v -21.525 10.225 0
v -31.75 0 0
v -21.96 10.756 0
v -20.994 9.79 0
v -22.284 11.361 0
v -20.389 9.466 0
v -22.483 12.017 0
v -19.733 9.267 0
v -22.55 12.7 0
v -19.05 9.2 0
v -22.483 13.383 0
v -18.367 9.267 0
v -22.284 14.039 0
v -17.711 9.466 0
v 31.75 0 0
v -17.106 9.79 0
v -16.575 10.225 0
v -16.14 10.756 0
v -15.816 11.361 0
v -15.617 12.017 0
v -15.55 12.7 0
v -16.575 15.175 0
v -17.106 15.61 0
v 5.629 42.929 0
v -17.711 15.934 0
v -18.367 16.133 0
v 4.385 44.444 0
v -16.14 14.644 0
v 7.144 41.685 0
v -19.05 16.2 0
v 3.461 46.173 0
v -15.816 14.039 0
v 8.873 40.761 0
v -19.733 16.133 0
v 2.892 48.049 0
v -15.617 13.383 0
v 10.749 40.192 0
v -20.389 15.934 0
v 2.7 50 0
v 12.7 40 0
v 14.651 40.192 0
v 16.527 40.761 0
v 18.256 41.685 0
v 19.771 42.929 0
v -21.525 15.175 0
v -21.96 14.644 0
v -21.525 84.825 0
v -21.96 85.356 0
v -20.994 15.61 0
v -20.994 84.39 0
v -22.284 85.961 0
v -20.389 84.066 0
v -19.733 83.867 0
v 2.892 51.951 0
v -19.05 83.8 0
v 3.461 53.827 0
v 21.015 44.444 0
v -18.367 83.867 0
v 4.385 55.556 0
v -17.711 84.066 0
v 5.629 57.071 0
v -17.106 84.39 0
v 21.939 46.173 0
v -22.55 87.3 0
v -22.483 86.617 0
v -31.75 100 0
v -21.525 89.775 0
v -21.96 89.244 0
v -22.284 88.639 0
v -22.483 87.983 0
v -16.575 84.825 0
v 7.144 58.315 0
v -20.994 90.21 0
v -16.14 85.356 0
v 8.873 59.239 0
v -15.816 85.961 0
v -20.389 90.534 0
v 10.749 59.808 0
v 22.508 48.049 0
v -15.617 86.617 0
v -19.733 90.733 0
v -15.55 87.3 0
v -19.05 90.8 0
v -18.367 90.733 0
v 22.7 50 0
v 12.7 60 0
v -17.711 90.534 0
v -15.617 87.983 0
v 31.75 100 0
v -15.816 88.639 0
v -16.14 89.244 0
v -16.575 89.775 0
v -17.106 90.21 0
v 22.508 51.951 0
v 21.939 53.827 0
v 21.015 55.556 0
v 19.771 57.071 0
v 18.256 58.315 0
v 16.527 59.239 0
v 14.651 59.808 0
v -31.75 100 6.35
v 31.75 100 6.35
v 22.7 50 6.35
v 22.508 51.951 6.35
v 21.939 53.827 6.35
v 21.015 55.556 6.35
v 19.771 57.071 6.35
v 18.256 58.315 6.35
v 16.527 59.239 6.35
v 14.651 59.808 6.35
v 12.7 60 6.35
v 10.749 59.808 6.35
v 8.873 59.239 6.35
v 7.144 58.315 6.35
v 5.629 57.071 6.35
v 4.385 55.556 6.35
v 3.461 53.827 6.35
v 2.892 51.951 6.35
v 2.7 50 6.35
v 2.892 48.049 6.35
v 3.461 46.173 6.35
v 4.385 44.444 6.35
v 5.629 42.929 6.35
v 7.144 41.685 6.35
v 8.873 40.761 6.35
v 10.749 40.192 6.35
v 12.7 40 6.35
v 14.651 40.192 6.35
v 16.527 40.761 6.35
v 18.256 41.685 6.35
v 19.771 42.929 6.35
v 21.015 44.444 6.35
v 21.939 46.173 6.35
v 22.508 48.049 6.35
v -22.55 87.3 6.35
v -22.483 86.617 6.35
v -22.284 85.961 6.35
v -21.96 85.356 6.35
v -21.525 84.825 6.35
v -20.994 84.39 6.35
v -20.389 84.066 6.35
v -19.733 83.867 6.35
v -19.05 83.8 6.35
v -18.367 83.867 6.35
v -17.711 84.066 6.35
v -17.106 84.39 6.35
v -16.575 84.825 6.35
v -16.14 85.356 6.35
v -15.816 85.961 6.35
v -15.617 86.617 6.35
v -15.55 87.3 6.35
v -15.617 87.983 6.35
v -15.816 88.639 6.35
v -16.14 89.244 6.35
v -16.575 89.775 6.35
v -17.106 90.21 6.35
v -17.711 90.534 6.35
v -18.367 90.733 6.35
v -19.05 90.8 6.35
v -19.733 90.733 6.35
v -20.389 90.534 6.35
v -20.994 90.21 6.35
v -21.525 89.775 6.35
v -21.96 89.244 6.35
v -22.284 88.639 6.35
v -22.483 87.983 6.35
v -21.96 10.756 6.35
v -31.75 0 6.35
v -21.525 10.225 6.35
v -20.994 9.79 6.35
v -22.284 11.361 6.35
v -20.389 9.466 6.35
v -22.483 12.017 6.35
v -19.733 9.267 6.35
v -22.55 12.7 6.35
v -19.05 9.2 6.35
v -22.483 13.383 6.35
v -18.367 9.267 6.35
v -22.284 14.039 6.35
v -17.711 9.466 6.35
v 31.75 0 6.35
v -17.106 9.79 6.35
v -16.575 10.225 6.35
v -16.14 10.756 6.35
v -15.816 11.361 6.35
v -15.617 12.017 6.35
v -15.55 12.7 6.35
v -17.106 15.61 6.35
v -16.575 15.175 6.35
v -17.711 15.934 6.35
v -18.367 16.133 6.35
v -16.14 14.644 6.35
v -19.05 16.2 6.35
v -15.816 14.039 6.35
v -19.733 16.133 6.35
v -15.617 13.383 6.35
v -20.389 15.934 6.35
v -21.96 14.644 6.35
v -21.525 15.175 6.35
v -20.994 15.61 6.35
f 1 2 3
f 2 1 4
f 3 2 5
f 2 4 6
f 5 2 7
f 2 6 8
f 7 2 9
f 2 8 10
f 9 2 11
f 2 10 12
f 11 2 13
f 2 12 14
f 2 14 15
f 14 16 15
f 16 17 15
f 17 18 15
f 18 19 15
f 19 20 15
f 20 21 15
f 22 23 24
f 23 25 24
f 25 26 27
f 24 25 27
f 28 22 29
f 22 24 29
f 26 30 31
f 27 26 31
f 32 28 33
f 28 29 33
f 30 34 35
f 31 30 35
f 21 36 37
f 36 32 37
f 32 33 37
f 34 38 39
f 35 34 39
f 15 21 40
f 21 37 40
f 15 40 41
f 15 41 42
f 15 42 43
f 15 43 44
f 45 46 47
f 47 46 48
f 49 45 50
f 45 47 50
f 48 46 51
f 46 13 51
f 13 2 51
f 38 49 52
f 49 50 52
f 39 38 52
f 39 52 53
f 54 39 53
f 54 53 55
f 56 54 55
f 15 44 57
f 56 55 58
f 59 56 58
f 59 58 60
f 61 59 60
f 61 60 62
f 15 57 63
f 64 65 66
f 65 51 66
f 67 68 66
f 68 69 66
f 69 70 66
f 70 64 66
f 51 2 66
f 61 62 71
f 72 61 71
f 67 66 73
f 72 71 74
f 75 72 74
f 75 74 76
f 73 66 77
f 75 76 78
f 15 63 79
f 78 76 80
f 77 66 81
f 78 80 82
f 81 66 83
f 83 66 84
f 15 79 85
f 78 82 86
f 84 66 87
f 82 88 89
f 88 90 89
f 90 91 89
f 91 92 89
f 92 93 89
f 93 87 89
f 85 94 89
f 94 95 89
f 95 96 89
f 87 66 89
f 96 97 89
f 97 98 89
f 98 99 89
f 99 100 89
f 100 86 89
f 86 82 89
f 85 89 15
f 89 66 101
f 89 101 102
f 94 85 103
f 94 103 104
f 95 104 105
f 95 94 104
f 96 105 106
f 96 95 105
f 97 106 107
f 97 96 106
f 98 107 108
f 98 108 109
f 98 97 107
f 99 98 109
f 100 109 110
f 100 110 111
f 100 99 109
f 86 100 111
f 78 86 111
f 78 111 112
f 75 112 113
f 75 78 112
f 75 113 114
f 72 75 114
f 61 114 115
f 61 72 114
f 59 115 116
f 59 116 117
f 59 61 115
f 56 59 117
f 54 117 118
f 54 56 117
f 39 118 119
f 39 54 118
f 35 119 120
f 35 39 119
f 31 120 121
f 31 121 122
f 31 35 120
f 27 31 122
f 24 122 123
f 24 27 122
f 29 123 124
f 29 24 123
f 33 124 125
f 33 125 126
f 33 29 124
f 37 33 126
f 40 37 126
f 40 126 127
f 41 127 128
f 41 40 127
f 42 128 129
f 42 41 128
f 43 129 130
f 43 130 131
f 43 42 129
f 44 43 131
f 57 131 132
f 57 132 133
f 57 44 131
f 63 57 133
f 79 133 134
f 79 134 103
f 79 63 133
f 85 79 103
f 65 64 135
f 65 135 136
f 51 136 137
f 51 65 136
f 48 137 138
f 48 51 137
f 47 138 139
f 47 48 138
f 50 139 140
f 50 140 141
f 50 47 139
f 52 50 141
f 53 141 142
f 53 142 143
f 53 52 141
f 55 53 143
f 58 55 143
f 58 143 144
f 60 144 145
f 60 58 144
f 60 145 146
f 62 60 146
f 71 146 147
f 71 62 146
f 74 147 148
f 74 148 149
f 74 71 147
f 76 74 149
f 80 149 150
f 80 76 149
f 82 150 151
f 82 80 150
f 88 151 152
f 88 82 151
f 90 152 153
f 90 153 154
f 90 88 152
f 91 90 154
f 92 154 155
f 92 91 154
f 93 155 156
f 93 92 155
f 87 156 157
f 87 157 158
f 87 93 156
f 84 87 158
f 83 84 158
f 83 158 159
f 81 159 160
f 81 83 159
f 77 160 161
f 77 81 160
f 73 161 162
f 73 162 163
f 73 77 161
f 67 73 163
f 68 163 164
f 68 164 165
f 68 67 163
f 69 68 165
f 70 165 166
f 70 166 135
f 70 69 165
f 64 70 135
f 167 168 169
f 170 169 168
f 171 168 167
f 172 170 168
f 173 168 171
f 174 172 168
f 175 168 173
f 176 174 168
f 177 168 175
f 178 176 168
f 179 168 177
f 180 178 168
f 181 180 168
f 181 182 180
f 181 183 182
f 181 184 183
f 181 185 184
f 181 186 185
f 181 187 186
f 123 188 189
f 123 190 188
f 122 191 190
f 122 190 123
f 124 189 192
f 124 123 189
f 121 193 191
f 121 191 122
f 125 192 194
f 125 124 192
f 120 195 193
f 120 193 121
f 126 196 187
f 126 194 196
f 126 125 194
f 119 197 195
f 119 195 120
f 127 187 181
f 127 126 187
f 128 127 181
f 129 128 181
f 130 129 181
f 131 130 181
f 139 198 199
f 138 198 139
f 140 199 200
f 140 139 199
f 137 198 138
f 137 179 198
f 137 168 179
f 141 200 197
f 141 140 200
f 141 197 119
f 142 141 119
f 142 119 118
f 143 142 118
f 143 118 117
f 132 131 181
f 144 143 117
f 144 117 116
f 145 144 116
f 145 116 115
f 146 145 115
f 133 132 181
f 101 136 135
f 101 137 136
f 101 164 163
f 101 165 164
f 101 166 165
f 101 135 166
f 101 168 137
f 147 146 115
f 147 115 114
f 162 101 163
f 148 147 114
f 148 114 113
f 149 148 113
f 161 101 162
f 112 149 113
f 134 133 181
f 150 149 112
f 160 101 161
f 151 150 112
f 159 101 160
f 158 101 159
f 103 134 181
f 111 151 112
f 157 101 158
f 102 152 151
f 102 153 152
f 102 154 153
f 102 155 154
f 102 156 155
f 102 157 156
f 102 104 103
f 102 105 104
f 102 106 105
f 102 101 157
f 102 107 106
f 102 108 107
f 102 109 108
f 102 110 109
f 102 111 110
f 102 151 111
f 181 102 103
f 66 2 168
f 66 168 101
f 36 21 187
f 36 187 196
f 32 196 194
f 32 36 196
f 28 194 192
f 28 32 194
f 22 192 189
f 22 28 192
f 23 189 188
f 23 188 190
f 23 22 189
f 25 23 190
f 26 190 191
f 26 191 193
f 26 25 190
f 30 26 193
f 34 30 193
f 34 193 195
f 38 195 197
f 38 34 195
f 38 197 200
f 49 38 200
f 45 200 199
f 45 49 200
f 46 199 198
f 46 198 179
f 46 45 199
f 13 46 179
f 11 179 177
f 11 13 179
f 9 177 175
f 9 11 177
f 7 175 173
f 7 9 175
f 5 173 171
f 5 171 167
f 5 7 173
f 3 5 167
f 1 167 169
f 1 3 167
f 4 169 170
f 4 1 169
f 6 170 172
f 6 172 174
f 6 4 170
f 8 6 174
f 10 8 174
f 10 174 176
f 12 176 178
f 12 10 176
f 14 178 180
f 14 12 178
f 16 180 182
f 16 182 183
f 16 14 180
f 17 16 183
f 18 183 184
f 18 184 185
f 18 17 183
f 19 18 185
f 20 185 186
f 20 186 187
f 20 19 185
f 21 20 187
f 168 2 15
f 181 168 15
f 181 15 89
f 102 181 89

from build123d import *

# Parameters (mm, degrees)
SKETCH1_W           = 63.5
SKETCH1_H           = 100
SKETCH1_R           = 3.5
SKETCH1_R_2         = 10
BOSS_EXTRUDE1_DEPTH = 6.35


with BuildPart() as part:
    # Sketch1 → Boss-Extrude1 (new body)
    with BuildSketch(Plane.XY):
        with Locations((0, 50)):
            Rectangle(SKETCH1_W, SKETCH1_H)
        with Locations((-19.05, 12.7)):
            Circle(SKETCH1_R, mode=Mode.SUBTRACT)
        with Locations(Location((-19.05, 87.3, 0), (0, 0, 180))):
            Circle(SKETCH1_R, mode=Mode.SUBTRACT)
        with Locations((12.7, 50)):
            Circle(SKETCH1_R_2, mode=Mode.SUBTRACT)
    extrude(amount=BOSS_EXTRUDE1_DEPTH)


solid = part.part
